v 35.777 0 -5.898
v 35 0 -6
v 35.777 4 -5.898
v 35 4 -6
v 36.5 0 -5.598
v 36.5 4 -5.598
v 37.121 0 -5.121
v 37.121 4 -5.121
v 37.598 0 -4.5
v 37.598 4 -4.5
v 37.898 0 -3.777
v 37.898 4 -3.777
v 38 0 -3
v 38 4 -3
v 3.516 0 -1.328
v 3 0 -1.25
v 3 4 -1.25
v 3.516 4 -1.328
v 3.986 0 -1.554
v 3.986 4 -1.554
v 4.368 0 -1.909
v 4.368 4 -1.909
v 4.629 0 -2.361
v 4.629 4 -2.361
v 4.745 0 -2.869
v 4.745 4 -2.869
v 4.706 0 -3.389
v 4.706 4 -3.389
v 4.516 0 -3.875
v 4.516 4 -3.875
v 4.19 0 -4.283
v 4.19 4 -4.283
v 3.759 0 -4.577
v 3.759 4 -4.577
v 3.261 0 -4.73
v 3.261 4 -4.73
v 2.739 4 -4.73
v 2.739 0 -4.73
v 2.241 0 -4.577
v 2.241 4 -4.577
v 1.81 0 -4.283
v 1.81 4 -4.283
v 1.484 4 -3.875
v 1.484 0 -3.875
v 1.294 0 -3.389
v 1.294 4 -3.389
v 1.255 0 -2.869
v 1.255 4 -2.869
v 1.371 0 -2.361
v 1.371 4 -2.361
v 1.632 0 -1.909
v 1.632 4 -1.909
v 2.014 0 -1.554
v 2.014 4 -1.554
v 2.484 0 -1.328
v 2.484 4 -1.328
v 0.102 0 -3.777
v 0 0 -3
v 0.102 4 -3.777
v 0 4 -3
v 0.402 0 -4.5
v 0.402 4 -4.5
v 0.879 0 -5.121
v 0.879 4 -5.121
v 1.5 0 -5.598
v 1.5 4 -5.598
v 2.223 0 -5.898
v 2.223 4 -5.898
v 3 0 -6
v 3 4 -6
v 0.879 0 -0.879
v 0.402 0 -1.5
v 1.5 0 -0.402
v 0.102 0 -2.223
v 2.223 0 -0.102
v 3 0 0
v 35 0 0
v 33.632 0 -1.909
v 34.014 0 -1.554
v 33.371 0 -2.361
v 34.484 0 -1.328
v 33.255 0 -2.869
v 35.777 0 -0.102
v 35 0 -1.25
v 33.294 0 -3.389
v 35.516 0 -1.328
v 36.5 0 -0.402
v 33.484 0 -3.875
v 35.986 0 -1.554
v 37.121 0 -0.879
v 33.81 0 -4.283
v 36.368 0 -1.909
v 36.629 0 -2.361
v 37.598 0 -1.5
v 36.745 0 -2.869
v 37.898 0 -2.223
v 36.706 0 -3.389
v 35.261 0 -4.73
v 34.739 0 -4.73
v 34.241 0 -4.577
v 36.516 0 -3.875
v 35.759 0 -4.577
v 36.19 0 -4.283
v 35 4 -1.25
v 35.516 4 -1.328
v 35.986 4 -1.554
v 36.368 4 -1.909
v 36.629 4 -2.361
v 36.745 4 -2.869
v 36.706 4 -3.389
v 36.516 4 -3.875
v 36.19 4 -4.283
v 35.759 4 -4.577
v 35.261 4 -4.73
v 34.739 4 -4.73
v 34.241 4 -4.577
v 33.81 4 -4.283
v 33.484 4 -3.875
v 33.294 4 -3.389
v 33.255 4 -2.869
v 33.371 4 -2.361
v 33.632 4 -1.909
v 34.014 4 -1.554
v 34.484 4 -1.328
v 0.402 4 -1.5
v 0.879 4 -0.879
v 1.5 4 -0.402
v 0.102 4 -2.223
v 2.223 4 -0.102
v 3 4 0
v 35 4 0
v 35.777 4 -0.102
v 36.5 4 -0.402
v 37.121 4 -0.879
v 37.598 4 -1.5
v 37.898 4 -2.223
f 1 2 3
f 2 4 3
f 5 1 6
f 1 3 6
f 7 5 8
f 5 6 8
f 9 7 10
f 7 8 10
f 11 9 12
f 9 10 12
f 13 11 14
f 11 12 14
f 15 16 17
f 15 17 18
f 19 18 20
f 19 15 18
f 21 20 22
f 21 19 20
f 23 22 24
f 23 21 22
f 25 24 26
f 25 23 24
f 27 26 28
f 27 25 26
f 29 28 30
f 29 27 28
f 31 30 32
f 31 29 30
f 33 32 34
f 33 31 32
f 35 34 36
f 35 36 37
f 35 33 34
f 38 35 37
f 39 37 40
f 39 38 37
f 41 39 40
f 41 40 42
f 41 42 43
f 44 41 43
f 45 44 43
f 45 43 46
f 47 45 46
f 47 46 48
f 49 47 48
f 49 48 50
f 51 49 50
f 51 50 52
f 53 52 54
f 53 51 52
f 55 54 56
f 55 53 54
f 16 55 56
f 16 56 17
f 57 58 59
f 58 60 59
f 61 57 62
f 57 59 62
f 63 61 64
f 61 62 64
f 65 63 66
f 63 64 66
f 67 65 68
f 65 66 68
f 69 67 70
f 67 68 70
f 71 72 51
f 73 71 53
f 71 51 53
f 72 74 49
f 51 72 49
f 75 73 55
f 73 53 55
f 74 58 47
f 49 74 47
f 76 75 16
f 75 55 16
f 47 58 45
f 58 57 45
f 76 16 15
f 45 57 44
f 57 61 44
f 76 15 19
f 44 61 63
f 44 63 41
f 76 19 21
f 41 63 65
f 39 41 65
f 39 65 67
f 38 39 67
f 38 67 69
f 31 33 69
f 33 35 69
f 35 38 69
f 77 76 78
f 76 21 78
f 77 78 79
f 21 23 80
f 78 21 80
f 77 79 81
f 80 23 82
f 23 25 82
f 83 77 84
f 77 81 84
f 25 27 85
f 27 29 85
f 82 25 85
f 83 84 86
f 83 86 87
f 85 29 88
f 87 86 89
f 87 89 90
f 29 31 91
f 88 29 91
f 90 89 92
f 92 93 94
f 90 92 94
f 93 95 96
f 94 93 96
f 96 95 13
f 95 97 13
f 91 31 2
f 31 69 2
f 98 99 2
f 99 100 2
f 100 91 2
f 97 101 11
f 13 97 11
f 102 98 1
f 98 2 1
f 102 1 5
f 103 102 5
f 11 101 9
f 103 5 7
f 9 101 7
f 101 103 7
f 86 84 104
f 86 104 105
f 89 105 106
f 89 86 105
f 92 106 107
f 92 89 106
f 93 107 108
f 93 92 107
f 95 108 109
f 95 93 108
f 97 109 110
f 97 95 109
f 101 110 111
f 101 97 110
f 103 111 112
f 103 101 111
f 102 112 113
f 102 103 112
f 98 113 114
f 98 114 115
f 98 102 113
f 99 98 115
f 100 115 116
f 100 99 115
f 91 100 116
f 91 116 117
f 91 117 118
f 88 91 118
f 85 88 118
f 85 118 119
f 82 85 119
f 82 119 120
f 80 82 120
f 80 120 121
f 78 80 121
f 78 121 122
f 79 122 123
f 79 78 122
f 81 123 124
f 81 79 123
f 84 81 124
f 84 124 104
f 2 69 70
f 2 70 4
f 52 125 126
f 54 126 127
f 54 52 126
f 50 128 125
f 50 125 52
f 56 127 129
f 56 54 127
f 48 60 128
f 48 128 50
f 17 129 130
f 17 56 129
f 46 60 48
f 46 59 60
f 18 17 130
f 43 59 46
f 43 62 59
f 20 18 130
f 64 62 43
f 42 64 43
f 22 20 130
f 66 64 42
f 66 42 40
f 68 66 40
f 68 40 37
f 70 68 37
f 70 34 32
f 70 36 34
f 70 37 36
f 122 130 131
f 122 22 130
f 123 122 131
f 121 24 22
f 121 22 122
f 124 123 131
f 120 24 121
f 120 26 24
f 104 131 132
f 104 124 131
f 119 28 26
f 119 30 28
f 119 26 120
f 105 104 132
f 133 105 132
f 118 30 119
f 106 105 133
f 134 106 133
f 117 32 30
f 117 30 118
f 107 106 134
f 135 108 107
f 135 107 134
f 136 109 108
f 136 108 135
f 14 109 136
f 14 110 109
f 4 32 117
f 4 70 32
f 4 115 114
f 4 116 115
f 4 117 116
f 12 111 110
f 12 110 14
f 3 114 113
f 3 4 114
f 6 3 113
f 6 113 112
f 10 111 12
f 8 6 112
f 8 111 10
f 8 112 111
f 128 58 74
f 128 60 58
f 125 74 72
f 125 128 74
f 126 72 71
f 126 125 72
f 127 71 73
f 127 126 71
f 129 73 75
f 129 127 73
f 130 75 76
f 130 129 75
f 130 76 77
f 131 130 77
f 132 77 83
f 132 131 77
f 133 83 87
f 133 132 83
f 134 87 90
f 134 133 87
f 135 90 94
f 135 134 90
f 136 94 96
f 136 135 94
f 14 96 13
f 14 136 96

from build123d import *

# Parameters (mm, degrees)
CROQUIS1_W              = 38
CROQUIS1_H              = 6
CROQUIS1_R              = 1.75
SALIENTE_EXTRUIR1_DEPTH = 4
REDONDEO1_R             = 3


with BuildPart() as part:
    # Croquis1 → Saliente-Extruir1 (new body)
    with BuildSketch(Plane(origin=(0, 0, 0), x_dir=(1, 0, 0), z_dir=(0, 1, 0))):
        with Locations((19, 3)):
            Rectangle(CROQUIS1_W, CROQUIS1_H)
        with Locations(Location((3, 3, 0), (0, 0, 270))):
            Circle(CROQUIS1_R, mode=Mode.SUBTRACT)
        with Locations(Location((35, 3, 0), (0, 0, 270))):
            Circle(CROQUIS1_R, mode=Mode.SUBTRACT)
    extrude(amount=SALIENTE_EXTRUIR1_DEPTH)

    # Redondeo1
    redondeo1_edges = [part.edges().sort_by_distance(p)[0] for p in [
        (38, 2, -6),
        (38, 2, 0),
        (0, 2, -6),
        (0, 2, 0),
    ]]
    fillet(redondeo1_edges, radius=REDONDEO1_R - 0.0001)  # a hair under: the kernel refuses the full size


solid = part.part
